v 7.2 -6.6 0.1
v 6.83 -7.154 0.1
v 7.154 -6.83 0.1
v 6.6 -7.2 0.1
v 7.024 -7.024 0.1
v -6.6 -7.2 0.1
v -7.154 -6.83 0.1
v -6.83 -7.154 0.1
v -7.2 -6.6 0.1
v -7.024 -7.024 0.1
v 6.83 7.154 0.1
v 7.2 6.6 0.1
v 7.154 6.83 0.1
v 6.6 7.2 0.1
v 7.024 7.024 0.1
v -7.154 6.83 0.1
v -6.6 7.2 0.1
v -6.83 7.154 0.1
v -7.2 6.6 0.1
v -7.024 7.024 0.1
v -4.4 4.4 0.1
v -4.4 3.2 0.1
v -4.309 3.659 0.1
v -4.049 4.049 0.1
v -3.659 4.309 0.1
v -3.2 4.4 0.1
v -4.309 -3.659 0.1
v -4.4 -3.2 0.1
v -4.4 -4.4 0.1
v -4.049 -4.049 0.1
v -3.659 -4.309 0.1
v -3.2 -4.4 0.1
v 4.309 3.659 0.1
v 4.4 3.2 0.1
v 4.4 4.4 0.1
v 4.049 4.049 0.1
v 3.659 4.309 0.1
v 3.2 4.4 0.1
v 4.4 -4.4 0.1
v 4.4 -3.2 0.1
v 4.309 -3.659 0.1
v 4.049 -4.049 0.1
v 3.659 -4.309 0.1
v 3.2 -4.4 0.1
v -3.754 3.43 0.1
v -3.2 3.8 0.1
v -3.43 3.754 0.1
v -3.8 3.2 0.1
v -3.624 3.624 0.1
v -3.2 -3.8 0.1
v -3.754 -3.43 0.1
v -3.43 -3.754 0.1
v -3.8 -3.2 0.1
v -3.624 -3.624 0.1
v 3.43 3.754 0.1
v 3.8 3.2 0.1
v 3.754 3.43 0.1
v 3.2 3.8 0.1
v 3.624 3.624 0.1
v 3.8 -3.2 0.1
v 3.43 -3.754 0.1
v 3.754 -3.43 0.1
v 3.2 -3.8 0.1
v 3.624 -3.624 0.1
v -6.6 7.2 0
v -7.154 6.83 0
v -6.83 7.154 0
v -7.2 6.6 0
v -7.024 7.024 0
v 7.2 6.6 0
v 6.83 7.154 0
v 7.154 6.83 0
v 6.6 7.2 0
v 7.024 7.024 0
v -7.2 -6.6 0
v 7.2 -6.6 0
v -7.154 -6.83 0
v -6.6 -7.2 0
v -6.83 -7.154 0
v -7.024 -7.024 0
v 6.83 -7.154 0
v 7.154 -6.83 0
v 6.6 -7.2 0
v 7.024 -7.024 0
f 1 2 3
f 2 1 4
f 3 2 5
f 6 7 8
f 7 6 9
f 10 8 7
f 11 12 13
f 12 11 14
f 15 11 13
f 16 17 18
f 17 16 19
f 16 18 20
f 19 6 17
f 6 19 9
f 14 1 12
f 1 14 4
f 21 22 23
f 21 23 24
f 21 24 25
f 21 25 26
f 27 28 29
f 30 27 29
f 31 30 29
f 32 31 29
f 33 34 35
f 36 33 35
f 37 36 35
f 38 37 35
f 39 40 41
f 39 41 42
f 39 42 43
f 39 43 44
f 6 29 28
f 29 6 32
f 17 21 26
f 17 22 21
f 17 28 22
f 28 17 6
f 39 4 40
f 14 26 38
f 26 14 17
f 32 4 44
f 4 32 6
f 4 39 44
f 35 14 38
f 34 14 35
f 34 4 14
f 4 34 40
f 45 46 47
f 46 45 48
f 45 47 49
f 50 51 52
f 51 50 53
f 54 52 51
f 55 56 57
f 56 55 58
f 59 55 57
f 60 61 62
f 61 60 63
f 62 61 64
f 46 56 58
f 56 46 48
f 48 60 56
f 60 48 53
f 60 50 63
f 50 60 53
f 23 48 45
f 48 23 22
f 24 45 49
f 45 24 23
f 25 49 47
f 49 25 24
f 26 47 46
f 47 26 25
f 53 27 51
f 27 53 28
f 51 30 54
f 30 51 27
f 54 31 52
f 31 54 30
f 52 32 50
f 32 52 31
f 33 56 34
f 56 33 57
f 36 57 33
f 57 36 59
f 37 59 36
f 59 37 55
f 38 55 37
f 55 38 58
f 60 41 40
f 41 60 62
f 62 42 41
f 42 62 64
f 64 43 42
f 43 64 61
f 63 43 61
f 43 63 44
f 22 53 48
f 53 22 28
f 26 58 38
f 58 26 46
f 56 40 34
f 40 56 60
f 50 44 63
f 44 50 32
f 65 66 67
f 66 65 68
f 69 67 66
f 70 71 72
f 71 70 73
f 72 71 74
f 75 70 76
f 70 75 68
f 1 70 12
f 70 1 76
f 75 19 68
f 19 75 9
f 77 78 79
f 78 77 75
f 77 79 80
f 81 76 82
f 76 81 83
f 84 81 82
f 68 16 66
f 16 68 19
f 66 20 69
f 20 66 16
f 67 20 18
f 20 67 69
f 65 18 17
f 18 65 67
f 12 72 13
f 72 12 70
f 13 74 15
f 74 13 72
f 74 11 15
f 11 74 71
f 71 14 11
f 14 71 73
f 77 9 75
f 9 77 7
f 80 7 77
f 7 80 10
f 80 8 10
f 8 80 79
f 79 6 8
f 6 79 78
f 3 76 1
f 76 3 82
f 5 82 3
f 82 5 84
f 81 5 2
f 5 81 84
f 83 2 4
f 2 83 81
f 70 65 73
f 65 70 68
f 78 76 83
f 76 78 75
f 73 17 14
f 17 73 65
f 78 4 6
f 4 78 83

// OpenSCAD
// file: ../p/box3u12.scad
use <../lib.scad>
function ldraw_lib__box3u12() = [
// 0 Box with 3 Parallel Faces without Any Edges
// 0 Name: box3u12.dat
// 0 Author: J.C. Tchang [tchang]
// 0 !LDRAW_ORG Primitive UPDATE 2014-02
// 0 !LICENSE Licensed under CC BY 4.0 : see CAreadme.txt
// 
// 0 BFC CERTIFY CCW
  [0,"BFC","CERTIFY"],
  [0,"BFC","CCW"],
// 
// 0 !HISTORY 2014-12-23 [PTadmin] Official Update 2014-02
// 
// 
// 4 16 -1 1 1 1 1 1 1 1 -1 -1 1 -1
  [4,16,-1,1,1,1,1,1,1,1,-1,-1,1,-1],
// 4 16 -1 1 1 -1 0 1 1 0 1 1 1 1
  [4,16,-1,1,1,-1,0,1,1,0,1,1,1,1],
// 4 16 1 1 -1 1 0 -1 -1 0 -1 -1 1 -1
  [4,16,1,1,-1,1,0,-1,-1,0,-1,-1,1,-1],
];
module ldraw_lib__box3u12(step=0, col=false, unit=2/5, alt=false, line=0.2, solid=!$preview)
    makepoly(ldraw_lib__box3u12(), step=step, col=col, unit=unit, alt=alt, line=line, solid=solid);
ldraw_lib__box3u12(line=0.2);
// file: ../p/1-4cyli.scad
use <../lib.scad>
function ldraw_lib__1_4cyli() = [
// 0 Cylinder 0.25
// 0 Name: 1-4cyli.dat
// 0 Author: James Jessiman
// 0 !LDRAW_ORG Primitive UPDATE 2012-01
// 0 !LICENSE Licensed under CC BY 4.0 : see CAreadme.txt
// 
// 0 BFC CERTIFY CCW
  [0,"BFC","CERTIFY"],
  [0,"BFC","CCW"],
// 
// 0 !HISTORY 2002-03-23 [sbliss] Added BFC statement.
// 0 !HISTORY 2002-04-25 [PTadmin] Official Update 2002-02
// 0 !HISTORY 2007-06-22 [PTadmin] Header formatted for Contributor Agreement
// 0 !HISTORY 2008-07-01 [PTadmin] Official Update 2008-01
// 0 !HISTORY 2012-02-16 [Philo] Changed to CCW
// 0 !HISTORY 2012-03-30 [PTadmin] Official Update 2012-01
// 
// 
// 4 16 1 1 0 0.9239 1 0.3827 0.9239 0 0.3827 1 0 0
  [4,16,1,1,0,0.9239,1,0.3827,0.9239,0,0.3827,1,0,0],
// 5 24 1 0 0 1 1 0 0.9239 0 0.3827 1 0 -1
  [5,24,1,0,0,1,1,0,0.9239,0,0.3827,1,0,-1],
// 4 16 0.9239 1 0.3827 0.7071 1 0.7071 0.7071 0 0.7071 0.9239 0 0.3827
  [4,16,0.9239,1,0.3827,0.7071,1,0.7071,0.7071,0,0.7071,0.9239,0,0.3827],
// 5 24 0.9239 0 0.3827 0.9239 1 0.3827 0.7071 0 0.7071 1 0 0
  [5,24,0.9239,0,0.3827,0.9239,1,0.3827,0.7071,0,0.7071,1,0,0],
// 4 16 0.7071 1 0.7071 0.3827 1 0.9239 0.3827 0 0.9239 0.7071 0 0.7071
  [4,16,0.7071,1,0.7071,0.3827,1,0.9239,0.3827,0,0.9239,0.7071,0,0.7071],
// 5 24 0.7071 0 0.7071 0.7071 1 0.7071 0.3827 0 0.9239 0.9239 0 0.3827
  [5,24,0.7071,0,0.7071,0.7071,1,0.7071,0.3827,0,0.9239,0.9239,0,0.3827],
// 4 16 0.3827 1 0.9239 0 1 1 0 0 1 0.3827 0 0.9239
  [4,16,0.3827,1,0.9239,0,1,1,0,0,1,0.3827,0,0.9239],
// 5 24 0.3827 0 0.9239 0.3827 1 0.9239 0 0 1 0.7071 0 0.7071
  [5,24,0.3827,0,0.9239,0.3827,1,0.9239,0,0,1,0.7071,0,0.7071],
// 5 24 0 0 1 0 1 1 0.3827 0 0.9239 -1 0 1
  [5,24,0,0,1,0,1,1,0.3827,0,0.9239,-1,0,1],
];
module ldraw_lib__1_4cyli(step=0, col=false, unit=2/5, alt=false, line=0.2, solid=!$preview)
    makepoly(ldraw_lib__1_4cyli(), step=step, col=col, unit=unit, alt=alt, line=line, solid=solid);
ldraw_lib__1_4cyli(line=0.2);
// file: ../p/1-4ring1.scad
use <../lib.scad>
function ldraw_lib__1_4ring1() = [
// 0 Ring  1 x 0.25
// 0 Name: 1-4ring1.dat
// 0 Author: Chris Dee [cwdee]
// 0 !LDRAW_ORG Primitive UPDATE 2012-01
// 0 !LICENSE Licensed under CC BY 4.0 : see CAreadme.txt
// 
// 0 BFC CERTIFY CCW
  [0,"BFC","CERTIFY"],
  [0,"BFC","CCW"],
// 
// 0 !HISTORY 2000-05-07 [PTadmin] Official Update 2000-01
// 0 !HISTORY 2002-11-22 [hafhead] Added BFC statement
// 0 !HISTORY 2002-11-30 [PTadmin] Official Update 2002-05
// 0 !HISTORY 2007-06-22 [PTadmin] Header formatted for Contributor Agreement
// 0 !HISTORY 2008-07-01 [PTadmin] Official Update 2008-01
// 0 !HISTORY 2012-02-16 [Philo] Changed to CCW
// 0 !HISTORY 2012-03-30 [PTadmin] Official Update 2012-01
// 
// 
// 4 16 2 0 0 1.8478 0 0.7654 0.9239 0 0.3827 1 0 0
  [4,16,2,0,0,1.8478,0,0.7654,0.9239,0,0.3827,1,0,0],
// 4 16 1.8478 0 0.7654 1.4142 0 1.4142 0.7071 0 0.7071 0.9239 0 0.3827
  [4,16,1.8478,0,0.7654,1.4142,0,1.4142,0.7071,0,0.7071,0.9239,0,0.3827],
// 4 16 1.4142 0 1.4142 0.7654 0 1.8478 0.3827 0 0.9239 0.7071 0 0.7071
  [4,16,1.4142,0,1.4142,0.7654,0,1.8478,0.3827,0,0.9239,0.7071,0,0.7071],
// 4 16 0.7654 0 1.8478 0 0 2 0 0 1 0.3827 0 0.9239
  [4,16,0.7654,0,1.8478,0,0,2,0,0,1,0.3827,0,0.9239],
];
module ldraw_lib__1_4ring1(step=0, col=false, unit=2/5, alt=false, line=0.2, solid=!$preview)
    makepoly(ldraw_lib__1_4ring1(), step=step, col=col, unit=unit, alt=alt, line=line, solid=solid);
ldraw_lib__1_4ring1(line=0.2);
// file: ../p/1-4ndis.scad
use <../lib.scad>
function ldraw_lib__1_4ndis() = [
// 0 Disc Negative 0.25
// 0 Name: 1-4ndis.dat
// 0 Author: James Jessiman
// 0 !LDRAW_ORG Primitive UPDATE 2012-01
// 0 !LICENSE Licensed under CC BY 4.0 : see CAreadme.txt
// 
// 0 BFC CERTIFY CCW
  [0,"BFC","CERTIFY"],
  [0,"BFC","CCW"],
// 
// 0 !HISTORY 2002-03-23 [sbliss] Added BFC Statement
// 0 !HISTORY 2002-04-25 [PTadmin] Official Update 2002-02
// 0 !HISTORY 2007-06-22 [PTadmin] Header formatted for Contributor Agreement
// 0 !HISTORY 2008-07-01 [PTadmin] Official Update 2008-01
// 0 !HISTORY 2012-02-16 [Philo] Changed to CCW
// 0 !HISTORY 2012-03-30 [PTadmin] Official Update 2012-01
// 
// 
// 3 16 0.9239 0 0.3827 1 0 0 1 0 1
  [3,16,0.9239,0,0.3827,1,0,0,1,0,1],
// 3 16 0.7071 0 0.7071 0.9239 0 0.3827 1 0 1
  [3,16,0.7071,0,0.7071,0.9239,0,0.3827,1,0,1],
// 3 16 0.3827 0 0.9239 0.7071 0 0.7071 1 0 1
  [3,16,0.3827,0,0.9239,0.7071,0,0.7071,1,0,1],
// 3 16 0 0 1 0.3827 0 0.9239 1 0 1
  [3,16,0,0,1,0.3827,0,0.9239,1,0,1],
];
module ldraw_lib__1_4ndis(step=0, col=false, unit=2/5, alt=false, line=0.2, solid=!$preview)
    makepoly(ldraw_lib__1_4ndis(), step=step, col=col, unit=unit, alt=alt, line=line, solid=solid);
ldraw_lib__1_4ndis(line=0.2);
// file: ../p/1-4chrd.scad
use <../lib.scad>
function ldraw_lib__1_4chrd() = [
// 0 Chord 0.25
// 0 Name: 1-4chrd.dat
// 0 Author: Max Martin Richter [MMR1988]
// 0 !LDRAW_ORG Primitive UPDATE 2023-05
// 0 !LICENSE Licensed under CC BY 4.0 : see CAreadme.txt
// 
// 0 BFC CERTIFY CCW
  [0,"BFC","CERTIFY"],
  [0,"BFC","CCW"],
// 
// 0 !HISTORY 2004-04-22 [PTadmin] Official Update 2004-02
// 0 !HISTORY 2007-10-09 [PTadmin] Header formatted for Contributor Agreement
// 0 !HISTORY 2008-07-01 [PTadmin] Official Update 2008-01
// 0 !HISTORY 2012-08-02 [MMR1988] Re-creation with PrimGen2 and Rectifier
// 0 !HISTORY 2012-08-09 [PTadmin] Official Update 2012-02
// 0 !HISTORY 2023-10-27 [OrionP] Change author to MMR1988 from hafhead
// 0 !HISTORY 2023-10-31 [OrionP] Official Update 2023-05
// 
// 4 16 0.9239 0 0.3827 0.3827 0 0.9239 0 0 1 1 0 0
  [4,16,0.9239,0,0.3827,0.3827,0,0.9239,0,0,1,1,0,0],
// 3 16 0.7071 0 0.7071 0.3827 0 0.9239 0.9239 0 0.3827
  [3,16,0.7071,0,0.7071,0.3827,0,0.9239,0.9239,0,0.3827],
];
module ldraw_lib__1_4chrd(step=0, col=false, unit=2/5, alt=false, line=0.2, solid=!$preview)
    makepoly(ldraw_lib__1_4chrd(), step=step, col=col, unit=unit, alt=alt, line=line, solid=solid);
ldraw_lib__1_4chrd(line=0.2);
// file: s/stickerback018x018.scad
use <../../lib.scad>
use <../../p/1-4chrd.scad>
use <../../p/1-4cyli.scad>
use <../../p/box3u12.scad>
function ldraw_lib__s__stickerback018x018() = [
// 0 ~Sticker Back  1.8 x  1.8
// 0 Name: s\stickerback018x018.dat
// 0 Author: Massimo Maso [Sirio]
// 0 !LDRAW_ORG Subpart UPDATE 2025-08
// 0 !LICENSE Licensed under CC BY 4.0 : see CAreadme.txt
// 
// 0 BFC CERTIFY CCW
  [0,"BFC","CERTIFY"],
  [0,"BFC","CCW"],
// 
// 0 !HISTORY 2025-08-31 [OrionP] Official Update 2025-08
// 
// 0 // Primitives
// 1 16 -16.5 0 16.5 -1.5 0 0 0 -1 0 0 0 1.5 1-4chrd.dat
  [1,16,-16.5,0,16.5,-1.5,0,0,0,-1,0,0,0,1.5, ldraw_lib__1_4chrd()],
// 1 16 16.5 0 16.5 1.5 0 0 0 -1 0 0 0 1.5 1-4chrd.dat
  [1,16,16.5,0,16.5,1.5,0,0,0,-1,0,0,0,1.5, ldraw_lib__1_4chrd()],
// 1 16 0 -.25 0 0 0 18 0 .25 0 16.5 0 0 box3u12.dat
  [1,16,0,-.25,0,0,0,18,0,.25,0,16.5,0,0, ldraw_lib__box3u12()],
// 1 16 -16.5 0 -16.5 -1.5 0 0 0 -1 0 0 0 -1.5 1-4chrd.dat
  [1,16,-16.5,0,-16.5,-1.5,0,0,0,-1,0,0,0,-1.5, ldraw_lib__1_4chrd()],
// 1 16 16.5 0 -16.5 1.5 0 0 0 -1 0 0 0 -1.5 1-4chrd.dat
  [1,16,16.5,0,-16.5,1.5,0,0,0,-1,0,0,0,-1.5, ldraw_lib__1_4chrd()],
// 1 16 -16.5 -.25 16.5 -1.5 0 0 0 .25 0 0 0 1.5 1-4cyli.dat
  [1,16,-16.5,-.25,16.5,-1.5,0,0,0,.25,0,0,0,1.5, ldraw_lib__1_4cyli()],
// 1 16 16.5 -.25 16.5 1.5 0 0 0 .25 0 0 0 1.5 1-4cyli.dat
  [1,16,16.5,-.25,16.5,1.5,0,0,0,.25,0,0,0,1.5, ldraw_lib__1_4cyli()],
// 1 16 -16.5 -.25 -16.5 -1.5 0 0 0 .25 0 0 0 -1.5 1-4cyli.dat
  [1,16,-16.5,-.25,-16.5,-1.5,0,0,0,.25,0,0,0,-1.5, ldraw_lib__1_4cyli()],
// 1 16 16.5 -.25 -16.5 1.5 0 0 0 .25 0 0 0 -1.5 1-4cyli.dat
  [1,16,16.5,-.25,-16.5,1.5,0,0,0,.25,0,0,0,-1.5, ldraw_lib__1_4cyli()],
// 0 // Bottom face
// 4 16 -16.5 0 18 16.5 0 18 18 0 16.5 -18 0 16.5
  [4,16,-16.5,0,18,16.5,0,18,18,0,16.5,-18,0,16.5],
// 4 16 -16.5 0 -18 -18 0 -16.5 18 0 -16.5 16.5 0 -18
  [4,16,-16.5,0,-18,-18,0,-16.5,18,0,-16.5,16.5,0,-18],
// 0 // Lateral face
// 4 16 -16.5 -.25 18 16.5 -.25 18 16.5 0 18 -16.5 0 18
  [4,16,-16.5,-.25,18,16.5,-.25,18,16.5,0,18,-16.5,0,18],
// 4 16 16.5 0 -18 16.5 -.25 -18 -16.5 -.25 -18 -16.5 0 -18
  [4,16,16.5,0,-18,16.5,-.25,-18,-16.5,-.25,-18,-16.5,0,-18],
];
module ldraw_lib__s__stickerback018x018(step=0, col=false, unit=2/5, alt=false, line=0.2, solid=!$preview)
    makepoly(ldraw_lib__s__stickerback018x018(), step=step, col=col, unit=unit, alt=alt, line=line, solid=solid);
ldraw_lib__s__stickerback018x018(line=0.2);
// file: s/6227186fs01.scad
use <../../lib.scad>
use <../../p/1-4chrd.scad>
use <../../p/1-4ndis.scad>
use <../../p/1-4ring1.scad>
function ldraw_lib__s__6227186fs01() = [
// 0 ~Sticker  1.8 x  1.8 with Green Rounded Square with Black Outline - Top Surface
// 0 Name: s\6227186fs01.dat
// 0 Author: Gerald Lasser [GeraldLasser]
// 0 !LDRAW_ORG Subpart UPDATE 2026-05
// 0 !LICENSE Licensed under CC BY 4.0 : see CAreadme.txt
// 
// 0 BFC CERTIFY CCW
  [0,"BFC","CERTIFY"],
  [0,"BFC","CCW"],
// 
// 0 !HISTORY 2026-05-31 [OrionP] Official Update 2026-05
// 
// 1 16 16.5 -.25 -16.5 1.5 0 0 0 1 0 0 0 -1.5 1-4chrd.dat
  [1,16,16.5,-.25,-16.5,1.5,0,0,0,1,0,0,0,-1.5, ldraw_lib__1_4chrd()],
// 1 16 -16.5 -.25 -16.5 -1.5 0 0 0 1 0 0 0 -1.5 1-4chrd.dat
  [1,16,-16.5,-.25,-16.5,-1.5,0,0,0,1,0,0,0,-1.5, ldraw_lib__1_4chrd()],
// 1 16 16.5 -.25 16.5 1.5 0 0 0 1 0 0 0 1.5 1-4chrd.dat
  [1,16,16.5,-.25,16.5,1.5,0,0,0,1,0,0,0,1.5, ldraw_lib__1_4chrd()],
// 1 16 -16.5 -.25 16.5 -1.5 0 0 0 1 0 0 0 1.5 1-4chrd.dat
  [1,16,-16.5,-.25,16.5,-1.5,0,0,0,1,0,0,0,1.5, ldraw_lib__1_4chrd()],
// 
// 4 16 -16.5 -.25 18 -18 -.25 16.5 -18 -.25 -16.5 -16.5 -.25 -18
  [4,16,-16.5,-.25,18,-18,-.25,16.5,-18,-.25,-16.5,-16.5,-.25,-18],
// 4 16 16.5 -.25 18 16.5 -.25 -18 18 -.25 -16.5 18 -.25 16.5
  [4,16,16.5,-.25,18,16.5,-.25,-18,18,-.25,-16.5,18,-.25,16.5],
// 
// 1 16 -8 -.25 8 -3 0 0 0 1 0 0 0 3 1-4ndis.dat
  [1,16,-8,-.25,8,-3,0,0,0,1,0,0,0,3, ldraw_lib__1_4ndis()],
// 1 16 -8 -.25 -8 -3 0 0 0 1 0 0 0 -3 1-4ndis.dat
  [1,16,-8,-.25,-8,-3,0,0,0,1,0,0,0,-3, ldraw_lib__1_4ndis()],
// 1 16 8 -.25 8 3 0 0 0 1 0 0 0 3 1-4ndis.dat
  [1,16,8,-.25,8,3,0,0,0,1,0,0,0,3, ldraw_lib__1_4ndis()],
// 1 16 8 -.25 -8 3 0 0 0 1 0 0 0 -3 1-4ndis.dat
  [1,16,8,-.25,-8,3,0,0,0,1,0,0,0,-3, ldraw_lib__1_4ndis()],
// 3 16 -16.5 -.25 -18 -11 -.25 -11 -11 -.25 -8
  [3,16,-16.5,-.25,-18,-11,-.25,-11,-11,-.25,-8],
// 3 16 -11 -.25 -11 -16.5 -.25 -18 -8 -.25 -11
  [3,16,-11,-.25,-11,-16.5,-.25,-18,-8,-.25,-11],
// 3 16 -16.5 -.25 18 -11 -.25 11 -8 -.25 11
  [3,16,-16.5,-.25,18,-11,-.25,11,-8,-.25,11],
// 3 16 -16.5 -.25 18 -11 -.25 8 -11 -.25 11
  [3,16,-16.5,-.25,18,-11,-.25,8,-11,-.25,11],
// 4 16 -11 -.25 -8 -11 -.25 8 -16.5 -.25 18 -16.5 -.25 -18
  [4,16,-11,-.25,-8,-11,-.25,8,-16.5,-.25,18,-16.5,-.25,-18],
// 3 16 11 -.25 -11 16.5 -.25 -18 11 -.25 -8
  [3,16,11,-.25,-11,16.5,-.25,-18,11,-.25,-8],
// 4 16 -16.5 -.25 18 -8 -.25 11 8 -.25 11 16.5 -.25 18
  [4,16,-16.5,-.25,18,-8,-.25,11,8,-.25,11,16.5,-.25,18],
// 4 16 8 -.25 -11 -8 -.25 -11 -16.5 -.25 -18 16.5 -.25 -18
  [4,16,8,-.25,-11,-8,-.25,-11,-16.5,-.25,-18,16.5,-.25,-18],
// 3 16 16.5 -.25 -18 11 -.25 -11 8 -.25 -11
  [3,16,16.5,-.25,-18,11,-.25,-11,8,-.25,-11],
// 3 16 11 -.25 11 16.5 -.25 18 8 -.25 11
  [3,16,11,-.25,11,16.5,-.25,18,8,-.25,11],
// 3 16 11 -.25 8 16.5 -.25 18 11 -.25 11
  [3,16,11,-.25,8,16.5,-.25,18,11,-.25,11],
// 4 16 16.5 -.25 18 11 -.25 8 11 -.25 -8 16.5 -.25 -18
  [4,16,16.5,-.25,18,11,-.25,8,11,-.25,-8,16.5,-.25,-18],
// 
// 0 BFC NOCLIP
  [0,"BFC","NOCLIP"],
// 1 2 -8 -.25 8 -1.5 0 0 0 1 0 0 0 1.5 1-4chrd.dat
  [1,2,-8,-.25,8,-1.5,0,0,0,1,0,0,0,1.5, ldraw_lib__1_4chrd()],
// 1 2 -8 -.25 -8 -1.5 0 0 0 1 0 0 0 -1.5 1-4chrd.dat
  [1,2,-8,-.25,-8,-1.5,0,0,0,1,0,0,0,-1.5, ldraw_lib__1_4chrd()],
// 1 2 8 -.25 8 1.5 0 0 0 1 0 0 0 1.5 1-4chrd.dat
  [1,2,8,-.25,8,1.5,0,0,0,1,0,0,0,1.5, ldraw_lib__1_4chrd()],
// 1 2 8 -.25 -8 1.5 0 0 0 1 0 0 0 -1.5 1-4chrd.dat
  [1,2,8,-.25,-8,1.5,0,0,0,1,0,0,0,-1.5, ldraw_lib__1_4chrd()],
// 4 2 8 -.25 9.5 -8 -.25 9.5 -9.5 -.25 8 9.5 -.25 8
  [4,2,8,-.25,9.5,-8,-.25,9.5,-9.5,-.25,8,9.5,-.25,8],
// 4 2 9.5 -.25 -8 9.5 -.25 8 -9.5 -.25 8 -9.5 -.25 -8
  [4,2,9.5,-.25,-8,9.5,-.25,8,-9.5,-.25,8,-9.5,-.25,-8],
// 4 2 9.5 -.25 -8 -9.5 -.25 -8 -8 -.25 -9.5 8 -.25 -9.5
  [4,2,9.5,-.25,-8,-9.5,-.25,-8,-8,-.25,-9.5,8,-.25,-9.5],
// 
// 1 0 -8 -.25 8 -1.5 0 0 0 1 0 0 0 1.5 1-4ring1.dat
  [1,0,-8,-.25,8,-1.5,0,0,0,1,0,0,0,1.5, ldraw_lib__1_4ring1()],
// 1 0 -8 -.25 -8 -1.5 0 0 0 1 0 0 0 -1.5 1-4ring1.dat
  [1,0,-8,-.25,-8,-1.5,0,0,0,1,0,0,0,-1.5, ldraw_lib__1_4ring1()],
// 1 0 8 -.25 8 1.5 0 0 0 1 0 0 0 1.5 1-4ring1.dat
  [1,0,8,-.25,8,1.5,0,0,0,1,0,0,0,1.5, ldraw_lib__1_4ring1()],
// 1 0 8 -.25 -8 1.5 0 0 0 1 0 0 0 -1.5 1-4ring1.dat
  [1,0,8,-.25,-8,1.5,0,0,0,1,0,0,0,-1.5, ldraw_lib__1_4ring1()],
// 4 0 -9.5 -.25 -8 -9.5 -.25 8 -11 -.25 8 -11 -.25 -8
  [4,0,-9.5,-.25,-8,-9.5,-.25,8,-11,-.25,8,-11,-.25,-8],
// 4 0 -8 -.25 11 -8 -.25 9.5 8 -.25 9.5 8 -.25 11
  [4,0,-8,-.25,11,-8,-.25,9.5,8,-.25,9.5,8,-.25,11],
// 4 0 11 -.25 8 9.5 -.25 8 9.5 -.25 -8 11 -.25 -8
  [4,0,11,-.25,8,9.5,-.25,8,9.5,-.25,-8,11,-.25,-8],
// 4 0 -8 -.25 -9.5 -8 -.25 -11 8 -.25 -11 8 -.25 -9.5
  [4,0,-8,-.25,-9.5,-8,-.25,-11,8,-.25,-11,8,-.25,-9.5],
];
module ldraw_lib__s__6227186fs01(step=0, col=false, unit=2/5, alt=false, line=0.2, solid=!$preview)
    makepoly(ldraw_lib__s__6227186fs01(), step=step, col=col, unit=unit, alt=alt, line=line, solid=solid);
ldraw_lib__s__6227186fs01(line=0.2);
// main file
use <../lib.scad>
use <s/6227186fs01.scad>
use <s/stickerback018x018.scad>
function ldraw_lib__6227186f() = [
// 0 Sticker  1.8 x  1.8 with Green Rounded Square with Black Outline
// 0 Name: 6227186f.dat
// 0 Author: Gerald Lasser [GeraldLasser]
// 0 !LDRAW_ORG Part UPDATE 2026-05
// 0 !LICENSE Licensed under CC BY 4.0 : see CAreadme.txt
// 
// 0 BFC CERTIFY CCW
  [0,"BFC","CERTIFY"],
  [0,"BFC","CCW"],
// 
// 0 !KEYWORDS BrickLink 60197stk01, Brickowl 311807, On-Button, Rebrickable 38761
// 0 !KEYWORDS Set 60197, Train
// 
// 0 !HISTORY 2026-05-31 [OrionP] Official Update 2026-05
// 
// 1 16 0 0 0 1 0 0 0 1 0 0 0 1 s\6227186fs01.dat
  [1,16,0,0,0,1,0,0,0,1,0,0,0,1, ldraw_lib__s__6227186fs01()],
// 1 16 0 0 0 1 0 0 0 1 0 0 0 1 s\stickerback018x018.dat
  [1,16,0,0,0,1,0,0,0,1,0,0,0,1, ldraw_lib__s__stickerback018x018()],
];
module ldraw_lib__6227186f(step=0, col=false, unit=2/5, alt=false, line=0.2, solid=!$preview)
    makepoly(ldraw_lib__6227186f(), step=step, col=col, unit=unit, alt=alt, line=line, solid=solid);
ldraw_lib__6227186f(line=0.2);
